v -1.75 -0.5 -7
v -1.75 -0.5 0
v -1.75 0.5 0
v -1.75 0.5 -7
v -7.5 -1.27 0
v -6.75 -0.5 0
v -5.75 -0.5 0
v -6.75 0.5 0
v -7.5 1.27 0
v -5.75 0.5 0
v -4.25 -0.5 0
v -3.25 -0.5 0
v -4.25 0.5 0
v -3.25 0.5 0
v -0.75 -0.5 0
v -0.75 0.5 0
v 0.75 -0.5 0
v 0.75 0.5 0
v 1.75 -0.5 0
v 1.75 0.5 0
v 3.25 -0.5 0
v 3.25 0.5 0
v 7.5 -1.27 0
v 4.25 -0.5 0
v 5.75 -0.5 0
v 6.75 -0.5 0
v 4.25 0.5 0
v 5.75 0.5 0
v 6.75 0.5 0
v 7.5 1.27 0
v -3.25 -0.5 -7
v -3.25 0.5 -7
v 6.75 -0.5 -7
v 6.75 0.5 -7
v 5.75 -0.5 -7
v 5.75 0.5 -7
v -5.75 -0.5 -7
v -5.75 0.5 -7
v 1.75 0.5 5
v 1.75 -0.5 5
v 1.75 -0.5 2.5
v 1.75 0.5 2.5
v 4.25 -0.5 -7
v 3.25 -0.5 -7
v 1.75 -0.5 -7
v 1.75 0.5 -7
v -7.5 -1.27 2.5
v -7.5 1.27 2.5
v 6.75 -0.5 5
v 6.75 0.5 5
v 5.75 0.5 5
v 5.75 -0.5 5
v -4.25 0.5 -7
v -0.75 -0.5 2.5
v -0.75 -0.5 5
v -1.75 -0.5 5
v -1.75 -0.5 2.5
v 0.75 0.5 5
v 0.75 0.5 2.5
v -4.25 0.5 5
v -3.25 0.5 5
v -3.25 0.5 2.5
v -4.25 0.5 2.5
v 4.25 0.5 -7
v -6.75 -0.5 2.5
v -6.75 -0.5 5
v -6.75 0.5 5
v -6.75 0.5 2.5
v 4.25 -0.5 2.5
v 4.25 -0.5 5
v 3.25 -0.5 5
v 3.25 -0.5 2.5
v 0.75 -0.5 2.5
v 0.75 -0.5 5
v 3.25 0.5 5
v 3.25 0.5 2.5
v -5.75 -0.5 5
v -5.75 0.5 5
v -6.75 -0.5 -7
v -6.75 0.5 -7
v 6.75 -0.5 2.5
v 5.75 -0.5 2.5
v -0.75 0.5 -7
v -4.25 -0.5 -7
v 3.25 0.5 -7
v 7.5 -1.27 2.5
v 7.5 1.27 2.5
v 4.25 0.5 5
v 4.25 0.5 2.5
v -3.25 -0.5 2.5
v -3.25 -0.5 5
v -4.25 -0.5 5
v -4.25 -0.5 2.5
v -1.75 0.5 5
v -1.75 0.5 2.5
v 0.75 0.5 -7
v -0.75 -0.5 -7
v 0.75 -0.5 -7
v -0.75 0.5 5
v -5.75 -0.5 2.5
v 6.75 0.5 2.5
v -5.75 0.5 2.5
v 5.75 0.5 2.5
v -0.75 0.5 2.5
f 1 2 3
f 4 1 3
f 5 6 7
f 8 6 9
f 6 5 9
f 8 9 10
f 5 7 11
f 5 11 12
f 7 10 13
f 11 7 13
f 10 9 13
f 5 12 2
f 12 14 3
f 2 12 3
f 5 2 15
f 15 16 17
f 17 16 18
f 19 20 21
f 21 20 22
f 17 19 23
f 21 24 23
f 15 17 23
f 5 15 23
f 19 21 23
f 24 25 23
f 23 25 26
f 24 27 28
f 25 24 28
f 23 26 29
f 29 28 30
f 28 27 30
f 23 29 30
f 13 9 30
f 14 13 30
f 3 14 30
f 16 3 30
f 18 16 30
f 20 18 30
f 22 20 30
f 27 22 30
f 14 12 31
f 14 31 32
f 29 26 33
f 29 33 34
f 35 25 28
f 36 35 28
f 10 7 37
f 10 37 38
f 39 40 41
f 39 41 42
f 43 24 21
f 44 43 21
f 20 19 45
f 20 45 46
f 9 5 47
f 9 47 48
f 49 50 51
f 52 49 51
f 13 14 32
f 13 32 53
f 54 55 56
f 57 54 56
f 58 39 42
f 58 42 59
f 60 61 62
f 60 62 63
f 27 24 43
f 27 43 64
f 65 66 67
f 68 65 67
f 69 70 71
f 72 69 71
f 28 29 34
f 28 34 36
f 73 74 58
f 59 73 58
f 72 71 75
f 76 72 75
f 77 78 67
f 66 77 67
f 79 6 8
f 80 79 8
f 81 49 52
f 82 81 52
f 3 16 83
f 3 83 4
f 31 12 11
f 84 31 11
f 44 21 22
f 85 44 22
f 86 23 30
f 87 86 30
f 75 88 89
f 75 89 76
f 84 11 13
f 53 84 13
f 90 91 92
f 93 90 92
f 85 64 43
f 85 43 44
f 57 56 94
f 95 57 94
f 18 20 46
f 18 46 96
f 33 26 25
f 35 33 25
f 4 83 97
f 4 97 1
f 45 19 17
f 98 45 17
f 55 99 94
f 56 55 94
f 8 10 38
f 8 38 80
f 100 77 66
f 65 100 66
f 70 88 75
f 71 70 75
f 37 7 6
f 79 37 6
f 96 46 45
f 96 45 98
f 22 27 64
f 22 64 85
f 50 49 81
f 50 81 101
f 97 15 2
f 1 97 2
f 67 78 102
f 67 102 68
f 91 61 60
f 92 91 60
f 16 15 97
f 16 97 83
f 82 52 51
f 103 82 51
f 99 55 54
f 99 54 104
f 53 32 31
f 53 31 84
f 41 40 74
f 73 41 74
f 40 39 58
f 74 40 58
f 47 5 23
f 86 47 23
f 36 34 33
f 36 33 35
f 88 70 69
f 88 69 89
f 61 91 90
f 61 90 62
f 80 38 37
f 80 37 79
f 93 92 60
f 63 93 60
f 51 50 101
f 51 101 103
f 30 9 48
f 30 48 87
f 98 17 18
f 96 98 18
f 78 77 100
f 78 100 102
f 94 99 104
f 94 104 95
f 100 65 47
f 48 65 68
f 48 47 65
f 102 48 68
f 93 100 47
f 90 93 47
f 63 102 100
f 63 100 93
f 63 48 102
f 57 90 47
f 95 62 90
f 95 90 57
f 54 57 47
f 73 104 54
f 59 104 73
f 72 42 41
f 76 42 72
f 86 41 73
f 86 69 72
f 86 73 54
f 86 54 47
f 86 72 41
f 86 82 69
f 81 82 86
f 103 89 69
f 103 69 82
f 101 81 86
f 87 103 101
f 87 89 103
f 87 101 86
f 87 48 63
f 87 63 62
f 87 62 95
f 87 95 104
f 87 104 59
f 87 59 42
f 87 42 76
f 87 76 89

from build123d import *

# Parameters (mm, degrees)
SKETCH_1_W           = 15
SKETCH_1_H           = 2.54
EXTRUDE_1_DEPTH      = 2.5
EXTRUDE_2_DEPTH      = 7
EXTRUDE_2_DEPTH_BACK = 5
SKETCH_2_W           = 1
SKETCH_2_H           = 1


with BuildPart() as part:
    # Эскиз1 → Бобышка-Вытянуть1 (new body)
    with BuildSketch(Plane.XY):
        Rectangle(SKETCH_1_W, SKETCH_1_H)
    extrude(amount=EXTRUDE_1_DEPTH)

    # Эскиз2 → Бобышка-Вытянуть2 (add, two sides: drawn at the far end of the back side and taken through both)
    with BuildSketch(Plane(origin=(0, 0, 0), x_dir=(-1, 0, 0), z_dir=(0, 0, -1)).offset(-EXTRUDE_2_DEPTH_BACK)):
        with Locations((-3.75, 0)):
            Rectangle(SKETCH_2_W, SKETCH_2_H)
        with Locations((-6.25, 0)):
            Rectangle(SKETCH_2_W, SKETCH_2_H)
        with Locations((-1.25, 0)):
            Rectangle(SKETCH_2_W, SKETCH_2_H)
        with Locations((1.25, 0)):
            Rectangle(SKETCH_2_W, SKETCH_2_H)
        with Locations((3.75, 0)):
            Rectangle(SKETCH_2_W, SKETCH_2_H)
        with Locations((6.25, 0)):
            Rectangle(SKETCH_2_W, SKETCH_2_H)
    extrude(amount=EXTRUDE_2_DEPTH + EXTRUDE_2_DEPTH_BACK)


solid = part.part
